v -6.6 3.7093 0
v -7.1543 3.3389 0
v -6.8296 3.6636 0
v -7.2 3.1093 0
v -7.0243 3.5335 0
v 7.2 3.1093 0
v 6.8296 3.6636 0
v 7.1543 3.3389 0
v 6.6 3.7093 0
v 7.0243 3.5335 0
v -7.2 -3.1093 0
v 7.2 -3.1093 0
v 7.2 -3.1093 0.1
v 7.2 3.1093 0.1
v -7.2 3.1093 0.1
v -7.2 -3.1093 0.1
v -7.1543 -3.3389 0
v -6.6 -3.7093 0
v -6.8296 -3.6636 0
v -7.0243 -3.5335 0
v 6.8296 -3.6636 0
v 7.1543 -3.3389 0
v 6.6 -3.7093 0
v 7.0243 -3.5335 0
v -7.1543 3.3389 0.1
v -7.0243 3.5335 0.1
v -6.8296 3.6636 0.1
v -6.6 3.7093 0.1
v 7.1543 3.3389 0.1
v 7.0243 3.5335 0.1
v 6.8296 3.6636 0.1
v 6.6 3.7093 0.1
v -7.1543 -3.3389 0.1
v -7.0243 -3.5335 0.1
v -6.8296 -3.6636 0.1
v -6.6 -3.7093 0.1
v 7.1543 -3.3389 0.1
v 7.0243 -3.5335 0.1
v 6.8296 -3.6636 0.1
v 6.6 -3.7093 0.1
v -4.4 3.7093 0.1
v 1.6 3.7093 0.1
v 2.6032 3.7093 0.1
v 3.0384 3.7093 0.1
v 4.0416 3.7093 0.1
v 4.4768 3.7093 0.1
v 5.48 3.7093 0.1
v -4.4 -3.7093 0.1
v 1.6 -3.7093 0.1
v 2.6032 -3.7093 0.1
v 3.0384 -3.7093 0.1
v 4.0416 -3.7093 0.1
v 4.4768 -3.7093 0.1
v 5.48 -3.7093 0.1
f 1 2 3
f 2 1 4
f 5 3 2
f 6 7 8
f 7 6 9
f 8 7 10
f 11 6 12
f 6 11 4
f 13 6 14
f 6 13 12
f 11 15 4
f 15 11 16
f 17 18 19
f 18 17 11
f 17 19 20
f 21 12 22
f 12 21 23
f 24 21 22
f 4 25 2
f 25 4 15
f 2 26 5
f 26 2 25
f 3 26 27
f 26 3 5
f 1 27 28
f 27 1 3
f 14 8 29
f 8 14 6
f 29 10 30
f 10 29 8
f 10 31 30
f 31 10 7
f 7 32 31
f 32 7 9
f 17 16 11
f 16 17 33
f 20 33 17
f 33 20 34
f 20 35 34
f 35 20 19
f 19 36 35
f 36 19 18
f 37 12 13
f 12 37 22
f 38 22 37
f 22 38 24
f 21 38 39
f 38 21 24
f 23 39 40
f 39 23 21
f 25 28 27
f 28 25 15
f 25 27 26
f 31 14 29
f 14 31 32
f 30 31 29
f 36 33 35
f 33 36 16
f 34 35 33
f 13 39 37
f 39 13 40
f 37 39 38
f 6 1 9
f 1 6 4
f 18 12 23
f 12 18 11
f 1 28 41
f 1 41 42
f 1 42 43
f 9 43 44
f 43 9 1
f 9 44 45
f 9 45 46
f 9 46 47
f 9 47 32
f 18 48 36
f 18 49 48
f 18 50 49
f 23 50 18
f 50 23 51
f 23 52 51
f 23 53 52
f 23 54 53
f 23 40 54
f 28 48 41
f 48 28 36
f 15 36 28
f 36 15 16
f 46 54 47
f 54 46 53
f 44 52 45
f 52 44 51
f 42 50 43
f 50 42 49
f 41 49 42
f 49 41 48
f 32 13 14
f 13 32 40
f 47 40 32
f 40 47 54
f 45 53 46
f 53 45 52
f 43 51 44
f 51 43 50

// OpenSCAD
// file: ../p/box3u12.scad
use <../lib.scad>
function ldraw_lib__box3u12() = [
// 0 Box with 3 Parallel Faces without Any Edges
// 0 Name: box3u12.dat
// 0 Author: J.C. Tchang [tchang]
// 0 !LDRAW_ORG Primitive UPDATE 2014-02
// 0 !LICENSE Licensed under CC BY 4.0 : see CAreadme.txt
// 
// 0 BFC CERTIFY CCW
  [0,"BFC","CERTIFY"],
  [0,"BFC","CCW"],
// 
// 0 !HISTORY 2014-12-23 [PTadmin] Official Update 2014-02
// 
// 
// 4 16 -1 1 1 1 1 1 1 1 -1 -1 1 -1
  [4,16,-1,1,1,1,1,1,1,1,-1,-1,1,-1],
// 4 16 -1 1 1 -1 0 1 1 0 1 1 1 1
  [4,16,-1,1,1,-1,0,1,1,0,1,1,1,1],
// 4 16 1 1 -1 1 0 -1 -1 0 -1 -1 1 -1
  [4,16,1,1,-1,1,0,-1,-1,0,-1,-1,1,-1],
];
module ldraw_lib__box3u12(step=0, col=false, unit=2/5, alt=false, line=0.2, solid=!$preview)
    makepoly(ldraw_lib__box3u12(), step=step, col=col, unit=unit, alt=alt, line=line, solid=solid);
ldraw_lib__box3u12(line=0.2);
// file: ../p/1-4cyli.scad
use <../lib.scad>
function ldraw_lib__1_4cyli() = [
// 0 Cylinder 0.25
// 0 Name: 1-4cyli.dat
// 0 Author: James Jessiman
// 0 !LDRAW_ORG Primitive UPDATE 2012-01
// 0 !LICENSE Licensed under CC BY 4.0 : see CAreadme.txt
// 
// 0 BFC CERTIFY CCW
  [0,"BFC","CERTIFY"],
  [0,"BFC","CCW"],
// 
// 0 !HISTORY 2002-03-23 [sbliss] Added BFC statement.
// 0 !HISTORY 2002-04-25 [PTadmin] Official Update 2002-02
// 0 !HISTORY 2007-06-22 [PTadmin] Header formatted for Contributor Agreement
// 0 !HISTORY 2008-07-01 [PTadmin] Official Update 2008-01
// 0 !HISTORY 2012-02-16 [Philo] Changed to CCW
// 0 !HISTORY 2012-03-30 [PTadmin] Official Update 2012-01
// 
// 
// 4 16 1 1 0 0.9239 1 0.3827 0.9239 0 0.3827 1 0 0
  [4,16,1,1,0,0.9239,1,0.3827,0.9239,0,0.3827,1,0,0],
// 5 24 1 0 0 1 1 0 0.9239 0 0.3827 1 0 -1
  [5,24,1,0,0,1,1,0,0.9239,0,0.3827,1,0,-1],
// 4 16 0.9239 1 0.3827 0.7071 1 0.7071 0.7071 0 0.7071 0.9239 0 0.3827
  [4,16,0.9239,1,0.3827,0.7071,1,0.7071,0.7071,0,0.7071,0.9239,0,0.3827],
// 5 24 0.9239 0 0.3827 0.9239 1 0.3827 0.7071 0 0.7071 1 0 0
  [5,24,0.9239,0,0.3827,0.9239,1,0.3827,0.7071,0,0.7071,1,0,0],
// 4 16 0.7071 1 0.7071 0.3827 1 0.9239 0.3827 0 0.9239 0.7071 0 0.7071
  [4,16,0.7071,1,0.7071,0.3827,1,0.9239,0.3827,0,0.9239,0.7071,0,0.7071],
// 5 24 0.7071 0 0.7071 0.7071 1 0.7071 0.3827 0 0.9239 0.9239 0 0.3827
  [5,24,0.7071,0,0.7071,0.7071,1,0.7071,0.3827,0,0.9239,0.9239,0,0.3827],
// 4 16 0.3827 1 0.9239 0 1 1 0 0 1 0.3827 0 0.9239
  [4,16,0.3827,1,0.9239,0,1,1,0,0,1,0.3827,0,0.9239],
// 5 24 0.3827 0 0.9239 0.3827 1 0.9239 0 0 1 0.7071 0 0.7071
  [5,24,0.3827,0,0.9239,0.3827,1,0.9239,0,0,1,0.7071,0,0.7071],
// 5 24 0 0 1 0 1 1 0.3827 0 0.9239 -1 0 1
  [5,24,0,0,1,0,1,1,0.3827,0,0.9239,-1,0,1],
];
module ldraw_lib__1_4cyli(step=0, col=false, unit=2/5, alt=false, line=0.2, solid=!$preview)
    makepoly(ldraw_lib__1_4cyli(), step=step, col=col, unit=unit, alt=alt, line=line, solid=solid);
ldraw_lib__1_4cyli(line=0.2);
// file: ../p/1-4chrd.scad
use <../lib.scad>
function ldraw_lib__1_4chrd() = [
// 0 Chord 0.25
// 0 Name: 1-4chrd.dat
// 0 Author: Max Martin Richter [MMR1988]
// 0 !LDRAW_ORG Primitive UPDATE 2023-05
// 0 !LICENSE Licensed under CC BY 4.0 : see CAreadme.txt
// 
// 0 BFC CERTIFY CCW
  [0,"BFC","CERTIFY"],
  [0,"BFC","CCW"],
// 
// 0 !HISTORY 2004-04-22 [PTadmin] Official Update 2004-02
// 0 !HISTORY 2007-10-09 [PTadmin] Header formatted for Contributor Agreement
// 0 !HISTORY 2008-07-01 [PTadmin] Official Update 2008-01
// 0 !HISTORY 2012-08-02 [MMR1988] Re-creation with PrimGen2 and Rectifier
// 0 !HISTORY 2012-08-09 [PTadmin] Official Update 2012-02
// 0 !HISTORY 2023-10-27 [OrionP] Change author to MMR1988 from hafhead
// 0 !HISTORY 2023-10-31 [OrionP] Official Update 2023-05
// 
// 4 16 0.9239 0 0.3827 0.3827 0 0.9239 0 0 1 1 0 0
  [4,16,0.9239,0,0.3827,0.3827,0,0.9239,0,0,1,1,0,0],
// 3 16 0.7071 0 0.7071 0.3827 0 0.9239 0.9239 0 0.3827
  [3,16,0.7071,0,0.7071,0.3827,0,0.9239,0.9239,0,0.3827],
];
module ldraw_lib__1_4chrd(step=0, col=false, unit=2/5, alt=false, line=0.2, solid=!$preview)
    makepoly(ldraw_lib__1_4chrd(), step=step, col=col, unit=unit, alt=alt, line=line, solid=solid);
ldraw_lib__1_4chrd(line=0.2);
// main file
use <../lib.scad>
use <../p/1-4chrd.scad>
use <../p/1-4cyli.scad>
use <../p/box3u12.scad>
function ldraw_lib__6221655c() = [
// 0 Sticker  0.9 x  1.8 with Black, 3 Grey and Red Stripes on White Bakground Right
// 0 Name: 6221655c.dat
// 0 Author: Massimo Maso [Sirio]
// 0 !LDRAW_ORG Part UPDATE 2024-09
// 0 !LICENSE Licensed under CC BY 4.0 : see CAreadme.txt
// 
// 0 BFC CERTIFY CCW
  [0,"BFC","CERTIFY"],
  [0,"BFC","CCW"],
// 
// 0 !KEYWORDS 3.0, 911 RSR, Porsche, Set 75888, Speed Champions, Turbo
// 
// 0 !HISTORY 2024-10-27 [OrionP] Official Update 2024-09
// 
// 0 // Primitives
// 1 16 -16.5 0 7.7732 -1.5 0 0 0 -1 0 0 0 1.5 1-4chrd.dat
  [1,16,-16.5,0,7.7732,-1.5,0,0,0,-1,0,0,0,1.5, ldraw_lib__1_4chrd()],
// 1 16 16.5 0 7.7732 1.5 0 0 0 -1 0 0 0 1.5 1-4chrd.dat
  [1,16,16.5,0,7.7732,1.5,0,0,0,-1,0,0,0,1.5, ldraw_lib__1_4chrd()],
// 1 16 0 -.25 0 0 0 18 0 .25 0 7.7732 0 0 box3u12.dat
  [1,16,0,-.25,0,0,0,18,0,.25,0,7.7732,0,0, ldraw_lib__box3u12()],
// 1 16 -16.5 0 -7.7732 -1.5 0 0 0 -1 0 0 0 -1.5 1-4chrd.dat
  [1,16,-16.5,0,-7.7732,-1.5,0,0,0,-1,0,0,0,-1.5, ldraw_lib__1_4chrd()],
// 1 16 16.5 0 -7.7732 1.5 0 0 0 -1 0 0 0 -1.5 1-4chrd.dat
  [1,16,16.5,0,-7.7732,1.5,0,0,0,-1,0,0,0,-1.5, ldraw_lib__1_4chrd()],
// 1 16 -16.5 -.25 7.7732 -1.5 0 0 0 .25 0 0 0 1.5 1-4cyli.dat
  [1,16,-16.5,-.25,7.7732,-1.5,0,0,0,.25,0,0,0,1.5, ldraw_lib__1_4cyli()],
// 1 16 16.5 -.25 7.7732 1.5 0 0 0 .25 0 0 0 1.5 1-4cyli.dat
  [1,16,16.5,-.25,7.7732,1.5,0,0,0,.25,0,0,0,1.5, ldraw_lib__1_4cyli()],
// 1 16 -16.5 -.25 -7.7732 -1.5 0 0 0 .25 0 0 0 -1.5 1-4cyli.dat
  [1,16,-16.5,-.25,-7.7732,-1.5,0,0,0,.25,0,0,0,-1.5, ldraw_lib__1_4cyli()],
// 1 16 16.5 -.25 -7.7732 1.5 0 0 0 .25 0 0 0 -1.5 1-4cyli.dat
  [1,16,16.5,-.25,-7.7732,1.5,0,0,0,.25,0,0,0,-1.5, ldraw_lib__1_4cyli()],
// 1 0 -16.5 -.25 7.7732 -1.5 0 0 0 1 0 0 0 1.5 1-4chrd.dat
  [1,0,-16.5,-.25,7.7732,-1.5,0,0,0,1,0,0,0,1.5, ldraw_lib__1_4chrd()],
// 1 15 16.5 -.25 7.7732 1.5 0 0 0 1 0 0 0 1.5 1-4chrd.dat
  [1,15,16.5,-.25,7.7732,1.5,0,0,0,1,0,0,0,1.5, ldraw_lib__1_4chrd()],
// 1 0 -16.5 -.25 -7.7732 -1.5 0 0 0 1 0 0 0 -1.5 1-4chrd.dat
  [1,0,-16.5,-.25,-7.7732,-1.5,0,0,0,1,0,0,0,-1.5, ldraw_lib__1_4chrd()],
// 1 15 16.5 -.25 -7.7732 1.5 0 0 0 1 0 0 0 -1.5 1-4chrd.dat
  [1,15,16.5,-.25,-7.7732,1.5,0,0,0,1,0,0,0,-1.5, ldraw_lib__1_4chrd()],
// 0 // Bottom face
// 4 16 -16.5 0 9.2732 16.5 0 9.2732 18 0 7.7732 -18 0 7.7732
  [4,16,-16.5,0,9.2732,16.5,0,9.2732,18,0,7.7732,-18,0,7.7732],
// 4 16 -16.5 0 -9.2732 -18 0 -7.7732 18 0 -7.7732 16.5 0 -9.2732
  [4,16,-16.5,0,-9.2732,-18,0,-7.7732,18,0,-7.7732,16.5,0,-9.2732],
// 0 // Lateral face
// 3 16 -16.5 0 9.2732 -16.5 -.25 9.2732 -11 -.25 9.2732
  [3,16,-16.5,0,9.2732,-16.5,-.25,9.2732,-11,-.25,9.2732],
// 3 16 -16.5 0 9.2732 -11 -.25 9.2732 4 -.25 9.2732
  [3,16,-16.5,0,9.2732,-11,-.25,9.2732,4,-.25,9.2732],
// 3 16 -16.5 0 9.2732 4 -.25 9.2732 6.508 -.25 9.2732
  [3,16,-16.5,0,9.2732,4,-.25,9.2732,6.508,-.25,9.2732],
// 4 16 -16.5 0 9.2732 6.508 -.25 9.2732 7.596 -.25 9.2732 16.5 0 9.2732
  [4,16,-16.5,0,9.2732,6.508,-.25,9.2732,7.596,-.25,9.2732,16.5,0,9.2732],
// 3 16 16.5 0 9.2732 7.596 -.25 9.2732 10.104 -.25 9.2732
  [3,16,16.5,0,9.2732,7.596,-.25,9.2732,10.104,-.25,9.2732],
// 3 16 16.5 0 9.2732 10.104 -.25 9.2732 11.192 -.25 9.2732
  [3,16,16.5,0,9.2732,10.104,-.25,9.2732,11.192,-.25,9.2732],
// 3 16 16.5 0 9.2732 11.192 -.25 9.2732 13.7 -.25 9.2732
  [3,16,16.5,0,9.2732,11.192,-.25,9.2732,13.7,-.25,9.2732],
// 3 16 16.5 0 9.2732 13.7 -.25 9.2732 16.5 -.25 9.2732
  [3,16,16.5,0,9.2732,13.7,-.25,9.2732,16.5,-.25,9.2732],
// 3 16 -16.5 0 -9.2732 -11 -.25 -9.2732 -16.5 -.25 -9.2732
  [3,16,-16.5,0,-9.2732,-11,-.25,-9.2732,-16.5,-.25,-9.2732],
// 3 16 -16.5 0 -9.2732 4 -.25 -9.2732 -11 -.25 -9.2732
  [3,16,-16.5,0,-9.2732,4,-.25,-9.2732,-11,-.25,-9.2732],
// 3 16 -16.5 0 -9.2732 6.508 -.25 -9.2732 4 -.25 -9.2732
  [3,16,-16.5,0,-9.2732,6.508,-.25,-9.2732,4,-.25,-9.2732],
// 4 16 -16.5 0 -9.2732 16.5 0 -9.2732 7.596 -.25 -9.2732 6.508 -.25 -9.2732
  [4,16,-16.5,0,-9.2732,16.5,0,-9.2732,7.596,-.25,-9.2732,6.508,-.25,-9.2732],
// 3 16 16.5 0 -9.2732 10.104 -.25 -9.2732 7.596 -.25 -9.2732
  [3,16,16.5,0,-9.2732,10.104,-.25,-9.2732,7.596,-.25,-9.2732],
// 3 16 16.5 0 -9.2732 11.192 -.25 -9.2732 10.104 -.25 -9.2732
  [3,16,16.5,0,-9.2732,11.192,-.25,-9.2732,10.104,-.25,-9.2732],
// 3 16 16.5 0 -9.2732 13.7 -.25 -9.2732 11.192 -.25 -9.2732
  [3,16,16.5,0,-9.2732,13.7,-.25,-9.2732,11.192,-.25,-9.2732],
// 3 16 16.5 0 -9.2732 16.5 -.25 -9.2732 13.7 -.25 -9.2732
  [3,16,16.5,0,-9.2732,16.5,-.25,-9.2732,13.7,-.25,-9.2732],
// 0 // Top face
// 0 // Black faces
// 4 0 -16.5 -.25 9.2732 -16.5 -.25 -9.2732 -11 -.25 -9.2732 -11 -.25 9.2732
  [4,0,-16.5,-.25,9.2732,-16.5,-.25,-9.2732,-11,-.25,-9.2732,-11,-.25,9.2732],
// 4 0 -16.5 -.25 9.2732 -18 -.25 7.7732 -18 -.25 -7.7732 -16.5 -.25 -9.2732
  [4,0,-16.5,-.25,9.2732,-18,-.25,7.7732,-18,-.25,-7.7732,-16.5,-.25,-9.2732],
// 0 // Grey faces
// 4 71 11.192 -.25 9.2732 11.192 -.25 -9.2732 13.7 -.25 -9.2732 13.7 -.25 9.2732
  [4,71,11.192,-.25,9.2732,11.192,-.25,-9.2732,13.7,-.25,-9.2732,13.7,-.25,9.2732],
// 4 71 7.596 -.25 9.2732 7.596 -.25 -9.2732 10.104 -.25 -9.2732 10.104 -.25 9.2732
  [4,71,7.596,-.25,9.2732,7.596,-.25,-9.2732,10.104,-.25,-9.2732,10.104,-.25,9.2732],
// 4 71 4 -.25 9.2732 4 -.25 -9.2732 6.508 -.25 -9.2732 6.508 -.25 9.2732
  [4,71,4,-.25,9.2732,4,-.25,-9.2732,6.508,-.25,-9.2732,6.508,-.25,9.2732],
// 0 // Red face
// 4 4 4 -.25 9.2732 -11 -.25 9.2732 -11 -.25 -9.2732 4 -.25 -9.2732
  [4,4,4,-.25,9.2732,-11,-.25,9.2732,-11,-.25,-9.2732,4,-.25,-9.2732],
// 0 // White faces
// 4 15 16.5 -.25 9.2732 16.5 -.25 -9.2732 18 -.25 -7.7732 18 -.25 7.7732
  [4,15,16.5,-.25,9.2732,16.5,-.25,-9.2732,18,-.25,-7.7732,18,-.25,7.7732],
// 4 15 16.5 -.25 9.2732 13.7 -.25 9.2732 13.7 -.25 -9.2732 16.5 -.25 -9.2732
  [4,15,16.5,-.25,9.2732,13.7,-.25,9.2732,13.7,-.25,-9.2732,16.5,-.25,-9.2732],
// 4 15 11.192 -.25 9.2732 10.104 -.25 9.2732 10.104 -.25 -9.2732 11.192 -.25 -9.2732
  [4,15,11.192,-.25,9.2732,10.104,-.25,9.2732,10.104,-.25,-9.2732,11.192,-.25,-9.2732],
// 4 15 7.596 -.25 9.2732 6.508 -.25 9.2732 6.508 -.25 -9.2732 7.596 -.25 -9.2732
  [4,15,7.596,-.25,9.2732,6.508,-.25,9.2732,6.508,-.25,-9.2732,7.596,-.25,-9.2732],
];
module ldraw_lib__6221655c(step=0, col=false, unit=2/5, alt=false, line=0.2, solid=!$preview)
    makepoly(ldraw_lib__6221655c(), step=step, col=col, unit=unit, alt=alt, line=line, solid=solid);
ldraw_lib__6221655c(line=0.2);
